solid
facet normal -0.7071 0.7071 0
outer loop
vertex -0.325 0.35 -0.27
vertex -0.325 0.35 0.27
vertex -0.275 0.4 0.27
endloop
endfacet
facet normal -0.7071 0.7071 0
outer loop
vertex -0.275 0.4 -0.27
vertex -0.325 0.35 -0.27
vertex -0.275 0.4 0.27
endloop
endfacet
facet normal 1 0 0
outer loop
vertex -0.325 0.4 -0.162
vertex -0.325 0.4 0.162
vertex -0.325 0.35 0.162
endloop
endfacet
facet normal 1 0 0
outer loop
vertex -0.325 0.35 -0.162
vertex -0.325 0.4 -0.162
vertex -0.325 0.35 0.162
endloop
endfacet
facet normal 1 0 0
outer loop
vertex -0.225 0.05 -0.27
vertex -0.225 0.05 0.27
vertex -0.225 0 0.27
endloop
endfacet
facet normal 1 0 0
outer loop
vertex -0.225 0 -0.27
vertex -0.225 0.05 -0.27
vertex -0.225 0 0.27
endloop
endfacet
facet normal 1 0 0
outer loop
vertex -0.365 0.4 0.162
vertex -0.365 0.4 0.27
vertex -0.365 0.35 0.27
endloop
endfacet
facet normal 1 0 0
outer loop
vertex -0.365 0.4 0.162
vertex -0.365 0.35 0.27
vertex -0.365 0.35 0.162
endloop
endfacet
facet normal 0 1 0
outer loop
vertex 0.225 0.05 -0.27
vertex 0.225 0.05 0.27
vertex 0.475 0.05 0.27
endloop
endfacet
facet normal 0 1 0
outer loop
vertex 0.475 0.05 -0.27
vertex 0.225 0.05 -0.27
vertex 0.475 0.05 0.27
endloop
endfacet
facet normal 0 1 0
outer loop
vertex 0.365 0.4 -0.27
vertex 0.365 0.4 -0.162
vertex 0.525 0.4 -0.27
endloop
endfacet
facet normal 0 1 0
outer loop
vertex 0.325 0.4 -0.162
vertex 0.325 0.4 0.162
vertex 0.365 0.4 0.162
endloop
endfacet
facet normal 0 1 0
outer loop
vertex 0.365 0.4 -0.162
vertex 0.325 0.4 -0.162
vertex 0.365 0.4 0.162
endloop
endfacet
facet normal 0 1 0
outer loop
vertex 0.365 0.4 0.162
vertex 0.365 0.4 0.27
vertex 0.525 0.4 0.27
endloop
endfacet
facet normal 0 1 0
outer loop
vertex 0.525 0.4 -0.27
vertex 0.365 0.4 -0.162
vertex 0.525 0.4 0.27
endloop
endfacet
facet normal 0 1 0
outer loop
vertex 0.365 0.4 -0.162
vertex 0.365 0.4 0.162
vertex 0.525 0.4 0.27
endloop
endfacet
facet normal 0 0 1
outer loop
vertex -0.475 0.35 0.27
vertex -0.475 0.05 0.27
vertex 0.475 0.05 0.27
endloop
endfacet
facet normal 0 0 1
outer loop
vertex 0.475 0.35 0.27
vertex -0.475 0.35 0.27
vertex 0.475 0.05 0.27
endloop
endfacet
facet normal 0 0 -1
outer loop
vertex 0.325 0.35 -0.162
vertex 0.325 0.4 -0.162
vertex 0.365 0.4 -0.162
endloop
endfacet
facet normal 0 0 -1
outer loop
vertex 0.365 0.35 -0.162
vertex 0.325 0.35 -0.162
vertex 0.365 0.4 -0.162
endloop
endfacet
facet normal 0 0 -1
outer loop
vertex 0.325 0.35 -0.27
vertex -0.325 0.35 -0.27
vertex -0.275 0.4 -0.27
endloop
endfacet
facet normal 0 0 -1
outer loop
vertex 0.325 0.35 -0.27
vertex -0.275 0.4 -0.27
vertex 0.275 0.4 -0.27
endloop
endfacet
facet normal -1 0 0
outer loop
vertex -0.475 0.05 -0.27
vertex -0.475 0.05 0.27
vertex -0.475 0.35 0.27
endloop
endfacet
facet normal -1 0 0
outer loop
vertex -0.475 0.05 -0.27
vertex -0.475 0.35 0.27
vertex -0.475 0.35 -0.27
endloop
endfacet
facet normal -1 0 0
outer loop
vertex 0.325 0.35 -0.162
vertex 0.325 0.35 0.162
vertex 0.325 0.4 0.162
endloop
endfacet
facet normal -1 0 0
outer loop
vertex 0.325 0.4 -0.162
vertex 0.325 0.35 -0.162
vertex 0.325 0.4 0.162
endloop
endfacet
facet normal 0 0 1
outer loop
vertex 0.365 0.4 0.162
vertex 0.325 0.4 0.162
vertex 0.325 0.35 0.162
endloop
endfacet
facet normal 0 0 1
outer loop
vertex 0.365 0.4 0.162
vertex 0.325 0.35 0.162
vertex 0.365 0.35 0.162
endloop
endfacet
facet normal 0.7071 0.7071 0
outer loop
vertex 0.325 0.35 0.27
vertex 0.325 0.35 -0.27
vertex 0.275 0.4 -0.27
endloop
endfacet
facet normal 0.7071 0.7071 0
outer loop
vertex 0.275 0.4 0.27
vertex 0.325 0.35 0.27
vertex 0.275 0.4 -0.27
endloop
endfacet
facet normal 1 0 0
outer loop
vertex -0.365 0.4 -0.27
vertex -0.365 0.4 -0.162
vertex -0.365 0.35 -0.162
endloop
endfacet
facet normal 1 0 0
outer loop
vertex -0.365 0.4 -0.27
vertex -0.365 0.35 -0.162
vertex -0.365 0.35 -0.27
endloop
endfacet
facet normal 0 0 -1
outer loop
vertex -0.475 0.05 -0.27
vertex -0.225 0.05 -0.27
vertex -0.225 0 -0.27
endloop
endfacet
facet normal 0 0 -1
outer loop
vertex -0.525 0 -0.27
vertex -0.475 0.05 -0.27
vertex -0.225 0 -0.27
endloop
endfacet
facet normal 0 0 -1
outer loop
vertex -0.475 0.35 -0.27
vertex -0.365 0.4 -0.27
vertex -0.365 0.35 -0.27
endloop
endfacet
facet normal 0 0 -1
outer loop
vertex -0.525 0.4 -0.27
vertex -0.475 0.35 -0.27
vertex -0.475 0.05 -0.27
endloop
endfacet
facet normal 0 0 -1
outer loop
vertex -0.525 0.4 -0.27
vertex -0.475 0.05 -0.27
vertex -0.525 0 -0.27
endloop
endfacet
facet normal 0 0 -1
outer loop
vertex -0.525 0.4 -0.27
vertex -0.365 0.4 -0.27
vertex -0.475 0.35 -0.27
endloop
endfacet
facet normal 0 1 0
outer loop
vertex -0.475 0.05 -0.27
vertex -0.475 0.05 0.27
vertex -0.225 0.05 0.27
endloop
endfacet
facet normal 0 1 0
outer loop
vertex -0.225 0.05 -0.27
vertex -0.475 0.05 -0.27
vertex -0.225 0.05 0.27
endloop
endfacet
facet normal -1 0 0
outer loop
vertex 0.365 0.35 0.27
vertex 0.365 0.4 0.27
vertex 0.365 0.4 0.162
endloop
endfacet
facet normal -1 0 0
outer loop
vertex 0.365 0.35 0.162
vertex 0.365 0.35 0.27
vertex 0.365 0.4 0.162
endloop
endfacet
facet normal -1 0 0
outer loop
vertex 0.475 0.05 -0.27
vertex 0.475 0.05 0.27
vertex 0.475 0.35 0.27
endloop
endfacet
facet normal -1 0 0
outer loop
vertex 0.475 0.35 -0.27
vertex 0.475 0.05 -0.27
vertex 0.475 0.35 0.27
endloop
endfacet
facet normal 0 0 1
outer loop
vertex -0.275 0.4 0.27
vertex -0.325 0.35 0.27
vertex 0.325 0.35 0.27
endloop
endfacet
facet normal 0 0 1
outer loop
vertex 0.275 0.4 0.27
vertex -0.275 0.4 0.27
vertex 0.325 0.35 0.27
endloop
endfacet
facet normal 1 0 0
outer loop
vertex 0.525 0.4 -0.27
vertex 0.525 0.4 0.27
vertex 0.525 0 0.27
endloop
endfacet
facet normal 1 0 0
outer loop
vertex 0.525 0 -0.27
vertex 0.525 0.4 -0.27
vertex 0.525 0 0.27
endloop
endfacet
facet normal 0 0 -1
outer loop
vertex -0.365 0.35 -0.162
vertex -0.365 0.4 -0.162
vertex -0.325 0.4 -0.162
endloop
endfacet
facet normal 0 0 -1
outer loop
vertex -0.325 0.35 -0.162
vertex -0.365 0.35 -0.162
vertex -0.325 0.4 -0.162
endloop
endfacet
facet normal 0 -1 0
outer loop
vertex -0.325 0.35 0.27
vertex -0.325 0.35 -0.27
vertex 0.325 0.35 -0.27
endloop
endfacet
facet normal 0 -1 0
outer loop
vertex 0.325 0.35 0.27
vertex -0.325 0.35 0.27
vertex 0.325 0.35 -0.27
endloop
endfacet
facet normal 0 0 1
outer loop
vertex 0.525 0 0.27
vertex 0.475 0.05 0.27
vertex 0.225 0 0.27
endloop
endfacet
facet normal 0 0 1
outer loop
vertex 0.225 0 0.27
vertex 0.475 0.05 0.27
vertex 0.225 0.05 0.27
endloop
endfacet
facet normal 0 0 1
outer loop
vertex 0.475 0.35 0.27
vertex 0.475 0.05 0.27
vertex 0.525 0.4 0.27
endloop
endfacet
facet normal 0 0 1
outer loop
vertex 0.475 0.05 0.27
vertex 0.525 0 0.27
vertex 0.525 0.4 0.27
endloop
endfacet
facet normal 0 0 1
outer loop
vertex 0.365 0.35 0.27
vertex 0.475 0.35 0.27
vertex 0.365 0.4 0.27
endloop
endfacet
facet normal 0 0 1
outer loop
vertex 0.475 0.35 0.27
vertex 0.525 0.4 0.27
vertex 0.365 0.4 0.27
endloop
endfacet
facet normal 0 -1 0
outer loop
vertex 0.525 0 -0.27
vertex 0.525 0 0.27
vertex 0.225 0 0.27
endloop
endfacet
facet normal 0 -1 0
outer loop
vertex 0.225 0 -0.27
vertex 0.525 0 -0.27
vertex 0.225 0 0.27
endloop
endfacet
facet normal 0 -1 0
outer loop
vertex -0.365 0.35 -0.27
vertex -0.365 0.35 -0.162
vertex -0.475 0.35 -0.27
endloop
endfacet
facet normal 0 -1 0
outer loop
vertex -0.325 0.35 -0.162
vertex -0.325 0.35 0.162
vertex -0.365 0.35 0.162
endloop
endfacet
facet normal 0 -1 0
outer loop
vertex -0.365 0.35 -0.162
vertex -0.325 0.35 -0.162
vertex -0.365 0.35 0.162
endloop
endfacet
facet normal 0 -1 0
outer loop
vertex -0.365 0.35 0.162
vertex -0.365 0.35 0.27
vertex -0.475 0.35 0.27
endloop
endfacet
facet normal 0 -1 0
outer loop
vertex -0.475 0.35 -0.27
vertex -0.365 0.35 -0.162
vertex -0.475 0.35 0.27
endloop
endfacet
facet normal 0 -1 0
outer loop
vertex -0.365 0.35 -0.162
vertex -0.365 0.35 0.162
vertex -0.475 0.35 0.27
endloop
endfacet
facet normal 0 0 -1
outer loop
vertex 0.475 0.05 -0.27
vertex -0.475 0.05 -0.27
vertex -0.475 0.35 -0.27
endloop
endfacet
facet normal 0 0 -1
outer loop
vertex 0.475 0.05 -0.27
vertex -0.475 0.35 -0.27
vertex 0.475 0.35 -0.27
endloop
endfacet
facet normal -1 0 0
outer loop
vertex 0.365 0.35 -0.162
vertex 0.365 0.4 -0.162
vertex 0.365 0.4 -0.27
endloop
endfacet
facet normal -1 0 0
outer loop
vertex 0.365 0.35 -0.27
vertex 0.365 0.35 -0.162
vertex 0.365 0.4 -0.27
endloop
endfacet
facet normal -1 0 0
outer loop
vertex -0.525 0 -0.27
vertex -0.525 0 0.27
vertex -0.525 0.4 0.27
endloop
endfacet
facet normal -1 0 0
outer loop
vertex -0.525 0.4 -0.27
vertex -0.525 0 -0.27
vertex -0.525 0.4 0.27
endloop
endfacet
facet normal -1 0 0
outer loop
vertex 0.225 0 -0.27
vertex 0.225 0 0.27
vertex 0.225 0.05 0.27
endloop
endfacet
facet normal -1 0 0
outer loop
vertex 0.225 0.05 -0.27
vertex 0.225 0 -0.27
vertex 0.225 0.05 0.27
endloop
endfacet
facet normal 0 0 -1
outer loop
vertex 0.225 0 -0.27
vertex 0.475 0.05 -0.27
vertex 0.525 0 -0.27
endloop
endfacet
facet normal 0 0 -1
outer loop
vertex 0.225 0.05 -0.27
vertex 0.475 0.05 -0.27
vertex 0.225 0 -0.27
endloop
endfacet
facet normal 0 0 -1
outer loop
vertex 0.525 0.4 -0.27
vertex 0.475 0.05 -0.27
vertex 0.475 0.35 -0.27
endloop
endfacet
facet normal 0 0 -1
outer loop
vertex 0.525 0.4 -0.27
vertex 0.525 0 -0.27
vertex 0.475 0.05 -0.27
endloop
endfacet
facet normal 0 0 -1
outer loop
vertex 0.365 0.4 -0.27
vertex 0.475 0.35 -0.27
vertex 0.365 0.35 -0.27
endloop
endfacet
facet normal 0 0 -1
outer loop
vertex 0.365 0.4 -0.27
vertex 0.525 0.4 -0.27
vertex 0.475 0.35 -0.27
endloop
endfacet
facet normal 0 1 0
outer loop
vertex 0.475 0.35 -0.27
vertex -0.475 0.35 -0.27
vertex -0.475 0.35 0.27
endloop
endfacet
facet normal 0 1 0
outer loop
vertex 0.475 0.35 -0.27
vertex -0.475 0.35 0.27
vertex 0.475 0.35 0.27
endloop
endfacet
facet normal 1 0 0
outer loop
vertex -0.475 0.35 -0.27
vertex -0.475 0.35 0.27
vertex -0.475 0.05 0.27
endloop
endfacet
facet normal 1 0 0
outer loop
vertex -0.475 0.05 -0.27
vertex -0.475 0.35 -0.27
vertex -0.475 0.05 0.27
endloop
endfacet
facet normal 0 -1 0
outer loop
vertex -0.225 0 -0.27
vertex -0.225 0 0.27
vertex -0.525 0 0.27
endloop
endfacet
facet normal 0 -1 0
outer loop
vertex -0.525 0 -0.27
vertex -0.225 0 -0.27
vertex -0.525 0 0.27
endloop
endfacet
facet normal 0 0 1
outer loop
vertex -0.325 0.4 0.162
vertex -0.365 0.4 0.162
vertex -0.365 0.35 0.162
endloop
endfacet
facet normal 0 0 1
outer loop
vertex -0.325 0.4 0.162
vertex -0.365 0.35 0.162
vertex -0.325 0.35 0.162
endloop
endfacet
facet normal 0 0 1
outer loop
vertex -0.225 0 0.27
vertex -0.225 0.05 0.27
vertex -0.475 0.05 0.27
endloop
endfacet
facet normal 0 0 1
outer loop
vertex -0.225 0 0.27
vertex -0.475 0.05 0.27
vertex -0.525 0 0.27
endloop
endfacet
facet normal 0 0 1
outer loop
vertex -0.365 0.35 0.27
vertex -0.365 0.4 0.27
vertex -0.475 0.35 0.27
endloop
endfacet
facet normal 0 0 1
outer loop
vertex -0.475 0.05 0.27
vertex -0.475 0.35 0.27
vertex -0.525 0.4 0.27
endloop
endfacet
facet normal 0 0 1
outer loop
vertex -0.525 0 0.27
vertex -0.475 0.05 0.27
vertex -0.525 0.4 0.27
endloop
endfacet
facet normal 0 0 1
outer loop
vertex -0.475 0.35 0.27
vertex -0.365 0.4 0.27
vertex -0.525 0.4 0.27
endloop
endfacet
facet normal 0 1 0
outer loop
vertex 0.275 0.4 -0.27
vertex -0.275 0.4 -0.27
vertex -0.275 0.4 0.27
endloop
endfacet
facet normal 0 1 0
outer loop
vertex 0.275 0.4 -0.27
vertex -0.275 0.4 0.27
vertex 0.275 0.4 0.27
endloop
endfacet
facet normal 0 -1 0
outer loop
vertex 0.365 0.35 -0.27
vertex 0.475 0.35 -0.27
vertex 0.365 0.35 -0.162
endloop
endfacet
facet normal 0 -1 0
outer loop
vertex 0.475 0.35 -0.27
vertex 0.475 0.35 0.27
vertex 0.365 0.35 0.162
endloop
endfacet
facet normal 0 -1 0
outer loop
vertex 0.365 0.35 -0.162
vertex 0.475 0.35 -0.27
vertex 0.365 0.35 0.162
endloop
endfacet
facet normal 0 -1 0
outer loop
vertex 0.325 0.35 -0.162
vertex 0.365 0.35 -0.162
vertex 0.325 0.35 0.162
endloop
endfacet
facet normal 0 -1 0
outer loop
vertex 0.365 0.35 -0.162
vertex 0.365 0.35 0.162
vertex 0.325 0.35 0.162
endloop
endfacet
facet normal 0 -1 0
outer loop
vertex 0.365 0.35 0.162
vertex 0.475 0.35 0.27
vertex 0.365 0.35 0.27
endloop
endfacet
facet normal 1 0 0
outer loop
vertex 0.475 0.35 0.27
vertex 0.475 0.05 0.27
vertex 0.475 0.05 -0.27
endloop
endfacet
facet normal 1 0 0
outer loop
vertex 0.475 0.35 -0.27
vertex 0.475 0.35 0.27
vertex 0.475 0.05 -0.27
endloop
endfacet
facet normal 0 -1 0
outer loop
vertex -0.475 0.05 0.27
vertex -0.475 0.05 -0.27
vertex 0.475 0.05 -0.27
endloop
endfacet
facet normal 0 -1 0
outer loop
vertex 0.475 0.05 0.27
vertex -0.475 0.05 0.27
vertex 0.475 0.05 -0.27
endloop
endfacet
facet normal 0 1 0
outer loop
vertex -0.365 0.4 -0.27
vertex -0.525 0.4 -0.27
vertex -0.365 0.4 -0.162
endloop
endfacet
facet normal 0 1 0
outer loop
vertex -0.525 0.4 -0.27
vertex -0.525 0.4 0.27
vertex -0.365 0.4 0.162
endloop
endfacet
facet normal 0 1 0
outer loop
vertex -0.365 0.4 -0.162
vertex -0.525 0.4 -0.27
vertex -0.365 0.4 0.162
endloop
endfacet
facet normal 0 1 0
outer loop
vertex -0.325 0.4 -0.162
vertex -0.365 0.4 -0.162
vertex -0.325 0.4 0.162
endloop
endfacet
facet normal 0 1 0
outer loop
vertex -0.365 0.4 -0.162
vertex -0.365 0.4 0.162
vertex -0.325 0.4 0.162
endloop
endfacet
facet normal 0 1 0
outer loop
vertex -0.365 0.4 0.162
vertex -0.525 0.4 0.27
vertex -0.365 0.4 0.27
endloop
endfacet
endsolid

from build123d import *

# Parameters (mm, degrees)
EXTRUDE_START       = 0.05
SKETCH_1_W          = 0.95
SKETCH_1_H          = 0.54
EXTRUDE_1_DEPTH     = 0.3
SKETCH_3_W          = 0.65
SKETCH_3_H          = 0.54
EXTRUDE_2_DEPTH     = 0.05
CHAMFER_1_SIZE      = 0.05
EXTRUDE_3_DEPTH     = 0.54
EXTRUDE_3_2_DEPTH   = 0.54
SKETCH_5_W          = 0.04
SKETCH_5_H          = 0.108
CUT_EXTRUDE_1_DEPTH = 0.05


with BuildPart() as part:
    # Эскиз1 → Бобышка-Вытянуть1 (new body)
    with BuildSketch(Plane(origin=(0, 0, 0), x_dir=(1, 0, 0), z_dir=(0, 1, 0)).offset(EXTRUDE_START)):
        Rectangle(SKETCH_1_W, SKETCH_1_H)
    extrude(amount=EXTRUDE_1_DEPTH)


with BuildPart() as body_2:
    # Эскиз3 → Бобышка-Вытянуть2 (new body)
    with BuildSketch(Plane(origin=(0, 0.35, 0), x_dir=(1, 0, 0), z_dir=(0, 1, 0))):
        Rectangle(SKETCH_3_W, SKETCH_3_H)
    extrude(amount=EXTRUDE_2_DEPTH)

    # Фаска1
    # the kernel refuses this chamfer: 0.05 mm, written as the material it takes off along each edge
    with BuildSketch(Plane(origin=(-0.325, 0.4, 0.398584149), x_dir=(-0.027495876610586285, -0.9996219169112968, 0), z_dir=(0, 0, -1)), Plane(origin=(0.325, 0.4, -0.398584149), x_dir=(0.027495876610586285, -0.9996219169112968, 0), z_dir=(0, 0, 1))) as chamfer_1_piece_1:
        Polygon((CHAMFER_1_SIZE * 0.999621916911, -CHAMFER_1_SIZE * 0.0274958766106), (-CHAMFER_1_SIZE * 0.0274958766106, -CHAMFER_1_SIZE * 0.999621916911), (0, 0), align=None)
    extrude(amount=0.797168299, mode=Mode.SUBTRACT)


with BuildPart() as body_3:
    # Эскиз4 → Бобышка-Вытянуть3 (new body)
    with BuildSketch(Plane.XY.offset(0.27)):
        Polygon((-0.525, 0), (-0.525, 0.4), (-0.325, 0.4), (-0.325, 0.35), (-0.475, 0.35), (-0.475, 0.05), (-0.225, 0.05), (-0.225, 0), align=None)
    extrude(amount=-EXTRUDE_3_DEPTH)


with BuildPart() as body_4:
    # Эскиз4 → Extrude 3 2 (new body)
    with BuildSketch(Plane.XY.offset(0.27)):
        Polygon((0.225, 0.05), (0.475, 0.05), (0.475, 0.35), (0.325, 0.35), (0.325, 0.4), (0.525, 0.4), (0.525, 0), (0.225, 0), align=None)
    extrude(amount=-EXTRUDE_3_2_DEPTH)


with BuildPart() as cut_extrude_1_tool:
    # Эскиз5 → Вырез-Вытянуть1 (new body)
    with BuildSketch(Plane(origin=(0, 0.4, 0), x_dir=(1, 0, 0), z_dir=(0, 1, 0))):
        with Locations((0.345, 0.216)):
            Rectangle(SKETCH_5_W, SKETCH_5_H)
        with Locations((-0.345, 0.216)):
            Rectangle(SKETCH_5_W, SKETCH_5_H)
        with Locations((-0.345, -0.216)):
            Rectangle(SKETCH_5_W, SKETCH_5_H)
        with Locations((0.345, -0.216)):
            Rectangle(SKETCH_5_W, SKETCH_5_H)
    extrude(amount=-CUT_EXTRUDE_1_DEPTH)


with BuildPart() as body_3_1:
    add(body_3.part)

    # Вырез-Вытянуть1: cut by cut_extrude_1_tool
    add(cut_extrude_1_tool.part, mode=Mode.SUBTRACT)


with BuildPart() as body_4_1:
    add(body_4.part)

    # Вырез-Вытянуть1: cut by cut_extrude_1_tool
    add(cut_extrude_1_tool.part, mode=Mode.SUBTRACT)


solid = Compound([part.part, body_2.part, body_3_1.part, body_4_1.part])
